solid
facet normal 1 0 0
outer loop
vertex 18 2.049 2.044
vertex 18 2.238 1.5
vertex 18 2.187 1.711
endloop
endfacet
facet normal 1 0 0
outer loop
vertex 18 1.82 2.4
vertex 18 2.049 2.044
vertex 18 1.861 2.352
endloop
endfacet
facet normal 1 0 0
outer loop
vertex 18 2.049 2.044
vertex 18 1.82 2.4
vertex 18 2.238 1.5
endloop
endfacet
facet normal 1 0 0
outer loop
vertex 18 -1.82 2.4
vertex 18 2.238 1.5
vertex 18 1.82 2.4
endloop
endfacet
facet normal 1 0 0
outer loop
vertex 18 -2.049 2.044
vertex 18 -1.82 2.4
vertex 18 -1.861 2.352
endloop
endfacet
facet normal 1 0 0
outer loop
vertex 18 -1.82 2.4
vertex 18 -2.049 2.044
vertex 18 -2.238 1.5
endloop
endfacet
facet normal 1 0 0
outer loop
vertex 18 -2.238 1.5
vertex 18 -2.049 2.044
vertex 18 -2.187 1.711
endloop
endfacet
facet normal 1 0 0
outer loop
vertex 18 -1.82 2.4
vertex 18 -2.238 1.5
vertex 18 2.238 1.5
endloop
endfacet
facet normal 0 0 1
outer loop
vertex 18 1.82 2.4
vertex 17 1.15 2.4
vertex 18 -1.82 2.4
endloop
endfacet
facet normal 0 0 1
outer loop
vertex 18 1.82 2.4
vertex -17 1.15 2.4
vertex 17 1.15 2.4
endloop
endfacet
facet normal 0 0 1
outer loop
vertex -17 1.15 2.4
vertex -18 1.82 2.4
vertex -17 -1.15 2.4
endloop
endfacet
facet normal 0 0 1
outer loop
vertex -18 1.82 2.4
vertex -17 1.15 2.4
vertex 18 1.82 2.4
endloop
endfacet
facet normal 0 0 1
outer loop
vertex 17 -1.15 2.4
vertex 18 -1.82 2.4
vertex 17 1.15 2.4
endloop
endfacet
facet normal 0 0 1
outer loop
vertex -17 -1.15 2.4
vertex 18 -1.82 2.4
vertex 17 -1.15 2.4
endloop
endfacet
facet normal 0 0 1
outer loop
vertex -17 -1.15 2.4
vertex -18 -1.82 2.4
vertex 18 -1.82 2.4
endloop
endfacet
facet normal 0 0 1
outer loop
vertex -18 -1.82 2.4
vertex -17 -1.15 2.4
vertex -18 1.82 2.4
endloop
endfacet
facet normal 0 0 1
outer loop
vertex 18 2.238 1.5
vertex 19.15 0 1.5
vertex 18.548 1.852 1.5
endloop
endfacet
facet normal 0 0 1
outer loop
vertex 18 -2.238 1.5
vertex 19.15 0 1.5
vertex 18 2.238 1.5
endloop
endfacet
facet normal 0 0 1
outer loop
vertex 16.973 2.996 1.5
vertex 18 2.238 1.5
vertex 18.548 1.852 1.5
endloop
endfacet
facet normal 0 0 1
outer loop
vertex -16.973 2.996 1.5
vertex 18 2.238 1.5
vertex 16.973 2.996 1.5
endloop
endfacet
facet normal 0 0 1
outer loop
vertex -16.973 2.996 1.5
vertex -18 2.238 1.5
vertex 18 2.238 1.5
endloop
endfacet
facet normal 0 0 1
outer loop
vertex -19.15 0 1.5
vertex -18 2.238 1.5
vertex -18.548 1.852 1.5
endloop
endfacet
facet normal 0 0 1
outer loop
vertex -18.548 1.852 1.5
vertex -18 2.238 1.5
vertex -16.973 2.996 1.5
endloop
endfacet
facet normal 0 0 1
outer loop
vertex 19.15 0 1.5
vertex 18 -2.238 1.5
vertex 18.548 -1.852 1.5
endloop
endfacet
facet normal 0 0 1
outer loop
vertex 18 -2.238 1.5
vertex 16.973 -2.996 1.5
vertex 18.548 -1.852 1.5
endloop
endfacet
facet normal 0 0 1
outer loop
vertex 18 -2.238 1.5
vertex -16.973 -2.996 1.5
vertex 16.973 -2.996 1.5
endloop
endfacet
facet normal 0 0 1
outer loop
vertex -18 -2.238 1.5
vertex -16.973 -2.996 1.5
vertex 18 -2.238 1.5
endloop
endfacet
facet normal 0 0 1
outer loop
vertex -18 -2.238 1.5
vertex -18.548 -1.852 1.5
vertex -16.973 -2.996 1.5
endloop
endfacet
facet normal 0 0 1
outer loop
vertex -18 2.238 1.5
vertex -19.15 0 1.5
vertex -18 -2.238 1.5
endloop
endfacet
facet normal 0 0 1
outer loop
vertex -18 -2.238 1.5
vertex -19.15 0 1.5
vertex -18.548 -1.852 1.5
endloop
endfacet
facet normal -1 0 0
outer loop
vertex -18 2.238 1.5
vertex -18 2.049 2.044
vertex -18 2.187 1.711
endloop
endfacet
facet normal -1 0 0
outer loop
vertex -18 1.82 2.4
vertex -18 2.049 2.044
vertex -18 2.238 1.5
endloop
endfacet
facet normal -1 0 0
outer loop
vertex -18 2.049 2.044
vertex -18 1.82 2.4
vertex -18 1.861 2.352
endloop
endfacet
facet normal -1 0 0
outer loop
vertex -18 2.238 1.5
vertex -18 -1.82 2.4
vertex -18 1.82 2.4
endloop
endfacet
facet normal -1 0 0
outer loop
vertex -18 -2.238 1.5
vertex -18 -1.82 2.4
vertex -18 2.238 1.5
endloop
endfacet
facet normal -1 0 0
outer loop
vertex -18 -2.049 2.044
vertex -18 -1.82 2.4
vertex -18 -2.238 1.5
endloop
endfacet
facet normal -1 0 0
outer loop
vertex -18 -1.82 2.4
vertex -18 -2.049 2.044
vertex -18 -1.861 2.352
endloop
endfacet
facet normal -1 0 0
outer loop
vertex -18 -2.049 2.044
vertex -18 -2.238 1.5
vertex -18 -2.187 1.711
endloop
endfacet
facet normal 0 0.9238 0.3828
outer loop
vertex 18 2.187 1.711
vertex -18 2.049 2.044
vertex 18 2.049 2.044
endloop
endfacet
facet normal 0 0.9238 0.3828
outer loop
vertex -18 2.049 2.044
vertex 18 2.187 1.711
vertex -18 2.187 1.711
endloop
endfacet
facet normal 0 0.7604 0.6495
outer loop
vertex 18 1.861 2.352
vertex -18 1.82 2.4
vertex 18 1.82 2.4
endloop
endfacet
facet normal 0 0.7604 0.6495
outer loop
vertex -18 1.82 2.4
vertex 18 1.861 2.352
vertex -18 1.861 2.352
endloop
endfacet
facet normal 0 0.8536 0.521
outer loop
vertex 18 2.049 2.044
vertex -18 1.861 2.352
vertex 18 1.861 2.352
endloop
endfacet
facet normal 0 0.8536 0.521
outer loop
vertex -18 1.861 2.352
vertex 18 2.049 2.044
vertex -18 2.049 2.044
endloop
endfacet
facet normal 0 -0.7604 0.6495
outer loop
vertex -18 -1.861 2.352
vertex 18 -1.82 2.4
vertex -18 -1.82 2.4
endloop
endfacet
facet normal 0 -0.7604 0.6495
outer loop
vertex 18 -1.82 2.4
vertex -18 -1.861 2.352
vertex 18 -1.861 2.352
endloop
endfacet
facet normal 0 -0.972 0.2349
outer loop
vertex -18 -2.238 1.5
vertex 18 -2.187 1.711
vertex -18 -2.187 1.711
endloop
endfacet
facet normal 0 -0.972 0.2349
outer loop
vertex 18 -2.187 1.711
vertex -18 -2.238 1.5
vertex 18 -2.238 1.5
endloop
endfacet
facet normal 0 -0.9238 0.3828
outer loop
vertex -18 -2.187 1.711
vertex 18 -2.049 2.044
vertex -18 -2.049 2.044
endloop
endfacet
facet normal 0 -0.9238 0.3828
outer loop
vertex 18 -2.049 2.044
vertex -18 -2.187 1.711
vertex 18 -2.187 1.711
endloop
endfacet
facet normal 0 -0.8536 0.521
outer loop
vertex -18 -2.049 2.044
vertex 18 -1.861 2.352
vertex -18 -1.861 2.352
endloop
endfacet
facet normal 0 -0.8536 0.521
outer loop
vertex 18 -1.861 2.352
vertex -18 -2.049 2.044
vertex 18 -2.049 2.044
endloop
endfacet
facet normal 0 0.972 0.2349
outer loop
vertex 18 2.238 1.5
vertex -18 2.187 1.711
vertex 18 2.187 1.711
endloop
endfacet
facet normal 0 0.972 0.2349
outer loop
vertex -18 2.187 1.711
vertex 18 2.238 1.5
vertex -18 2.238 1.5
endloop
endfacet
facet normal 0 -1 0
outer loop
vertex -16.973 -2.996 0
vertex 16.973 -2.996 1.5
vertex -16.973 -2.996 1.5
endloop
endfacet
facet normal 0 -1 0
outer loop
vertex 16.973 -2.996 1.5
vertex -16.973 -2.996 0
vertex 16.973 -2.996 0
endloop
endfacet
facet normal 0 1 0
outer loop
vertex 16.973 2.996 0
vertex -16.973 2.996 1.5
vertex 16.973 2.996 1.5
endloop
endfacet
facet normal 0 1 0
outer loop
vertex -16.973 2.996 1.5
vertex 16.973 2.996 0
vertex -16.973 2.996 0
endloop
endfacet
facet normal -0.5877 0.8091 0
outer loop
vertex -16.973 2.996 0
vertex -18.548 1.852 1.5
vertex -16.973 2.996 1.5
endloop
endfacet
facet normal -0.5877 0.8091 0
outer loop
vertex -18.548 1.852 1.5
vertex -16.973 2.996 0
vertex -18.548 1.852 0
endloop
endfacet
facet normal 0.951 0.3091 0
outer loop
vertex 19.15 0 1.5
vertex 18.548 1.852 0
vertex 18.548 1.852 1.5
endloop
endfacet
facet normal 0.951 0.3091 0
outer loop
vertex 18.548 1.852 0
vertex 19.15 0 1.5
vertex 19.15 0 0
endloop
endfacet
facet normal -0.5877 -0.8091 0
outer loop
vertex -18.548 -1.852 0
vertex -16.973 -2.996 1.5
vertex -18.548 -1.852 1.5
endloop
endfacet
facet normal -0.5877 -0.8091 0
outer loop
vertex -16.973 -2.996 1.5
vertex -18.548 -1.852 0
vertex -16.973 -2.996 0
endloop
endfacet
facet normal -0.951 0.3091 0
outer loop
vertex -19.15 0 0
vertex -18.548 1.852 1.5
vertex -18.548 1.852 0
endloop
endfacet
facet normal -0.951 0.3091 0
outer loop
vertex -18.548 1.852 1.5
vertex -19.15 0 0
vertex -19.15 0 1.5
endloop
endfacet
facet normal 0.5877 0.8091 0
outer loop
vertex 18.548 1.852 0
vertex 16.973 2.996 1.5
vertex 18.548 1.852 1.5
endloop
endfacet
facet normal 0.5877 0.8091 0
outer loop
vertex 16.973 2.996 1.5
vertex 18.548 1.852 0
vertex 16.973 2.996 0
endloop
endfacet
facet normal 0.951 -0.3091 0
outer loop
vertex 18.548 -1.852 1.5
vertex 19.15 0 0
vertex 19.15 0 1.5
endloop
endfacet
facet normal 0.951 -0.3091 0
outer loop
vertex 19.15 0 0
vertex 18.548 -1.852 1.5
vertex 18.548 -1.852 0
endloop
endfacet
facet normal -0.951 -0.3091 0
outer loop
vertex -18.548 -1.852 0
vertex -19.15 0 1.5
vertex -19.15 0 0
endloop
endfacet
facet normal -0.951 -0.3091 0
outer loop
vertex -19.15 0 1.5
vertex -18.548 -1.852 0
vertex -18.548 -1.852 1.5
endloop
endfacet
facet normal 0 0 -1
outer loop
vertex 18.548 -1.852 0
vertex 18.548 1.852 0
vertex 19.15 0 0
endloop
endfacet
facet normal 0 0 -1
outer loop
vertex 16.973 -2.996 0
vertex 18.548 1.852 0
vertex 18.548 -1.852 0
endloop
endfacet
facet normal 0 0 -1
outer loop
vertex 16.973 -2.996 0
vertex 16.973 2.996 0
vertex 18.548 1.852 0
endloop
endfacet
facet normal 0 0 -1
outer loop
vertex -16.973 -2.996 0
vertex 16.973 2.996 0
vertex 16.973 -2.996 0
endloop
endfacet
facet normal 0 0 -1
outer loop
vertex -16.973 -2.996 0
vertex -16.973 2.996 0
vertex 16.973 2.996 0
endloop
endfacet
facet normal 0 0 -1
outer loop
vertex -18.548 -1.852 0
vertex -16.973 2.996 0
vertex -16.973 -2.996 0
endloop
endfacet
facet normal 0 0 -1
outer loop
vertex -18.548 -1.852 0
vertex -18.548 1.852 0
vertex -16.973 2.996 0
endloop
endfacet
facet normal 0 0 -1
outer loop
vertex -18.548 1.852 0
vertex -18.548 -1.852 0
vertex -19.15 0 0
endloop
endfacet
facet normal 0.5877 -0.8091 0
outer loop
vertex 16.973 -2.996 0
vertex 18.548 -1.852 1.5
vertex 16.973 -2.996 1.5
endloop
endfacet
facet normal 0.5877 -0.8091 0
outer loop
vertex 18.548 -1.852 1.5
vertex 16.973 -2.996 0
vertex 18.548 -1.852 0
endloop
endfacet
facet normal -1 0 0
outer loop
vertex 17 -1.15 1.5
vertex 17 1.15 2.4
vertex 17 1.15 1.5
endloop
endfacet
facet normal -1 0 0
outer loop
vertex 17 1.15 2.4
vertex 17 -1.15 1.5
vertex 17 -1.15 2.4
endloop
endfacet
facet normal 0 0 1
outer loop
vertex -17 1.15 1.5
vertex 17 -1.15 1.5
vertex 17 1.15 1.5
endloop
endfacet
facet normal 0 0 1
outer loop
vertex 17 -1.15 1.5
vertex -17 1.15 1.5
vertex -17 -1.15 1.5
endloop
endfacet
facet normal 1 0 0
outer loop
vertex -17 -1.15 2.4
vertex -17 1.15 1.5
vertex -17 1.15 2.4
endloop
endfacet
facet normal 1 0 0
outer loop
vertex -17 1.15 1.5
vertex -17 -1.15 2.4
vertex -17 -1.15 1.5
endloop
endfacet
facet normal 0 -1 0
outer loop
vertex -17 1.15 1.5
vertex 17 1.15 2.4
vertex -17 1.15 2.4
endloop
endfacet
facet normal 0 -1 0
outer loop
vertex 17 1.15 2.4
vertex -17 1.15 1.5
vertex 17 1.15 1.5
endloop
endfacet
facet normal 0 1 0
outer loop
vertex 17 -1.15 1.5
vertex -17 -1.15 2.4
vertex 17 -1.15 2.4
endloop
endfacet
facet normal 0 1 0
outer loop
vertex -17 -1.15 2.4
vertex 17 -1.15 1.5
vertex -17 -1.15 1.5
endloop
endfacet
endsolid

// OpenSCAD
// file: components.scad
include <constants.scad>

*arduinoMock();
*motorMock();
*gyroMock();


// Main Arduino pro micro
arduinoSize = [34,2.3,18]; //[34,2.3,18]; ok values

module arduinoMock(){
		translate([0,0,arduinoSize[2]/2])cube(arduinoSize,center = true);	

		for (x = [0:12], y=[-1,1]) {
			*%translate([-arduinoSize[0]/2+(x+3/4)*INCH/10, 0, arduinoSize[2]/2+y*(arduinoSize[2]/2-INCH/20)])rotate([90,0,0])cylinder(r=INCH/30, h=arduinoSize[1]+.2,center = true,$fn=20);
		}
}

module arduinoHull(){
	clipThickness = .9;
	
	intersection() {
		translate([-arduinoSize[0]/2-strongThicknessHV[0],-arduinoSize[1]/2-strongThicknessHV[1],0])cube([arduinoSize[0]+2*strongThicknessHV[0], 2*strongThicknessHV[1]+arduinoSize[1], clipThickness]);
		translate([0,0,-arduinoSize[1]+2*clipThickness])rotate([0, 90, 0])cylinder(r=arduinoSize[1], h=arduinoSize[0]+2*strongThicknessHV[1]-.001,$fn=40,center = true);
	}

	//TODO remove after test print
	*translate([INCH/10,-arduinoSize[1]/2-minimumThicknessHV[0],0])cube([3/10*INCH,2*minimumThicknessHV[0]+arduinoSize[1],INCH/10]);
}

// gyro / acc

gyroSize=[20.5,16,1.8];
gyroFullThickness = 2.4;
gyroHolePadding=1.5;
gyroHoleRad = 1.25;

module gyroMock(){
	difference(){
		union() {
			translate([0,0,gyroFullThickness/2])cube(gyroSize+[0,0,gyroFullThickness-gyroSize[2]],center = true);

			

			for (x = [0:7]) {
				%translate([-gyroSize[0]/2+(x+1/2)*INCH/10, gyroSize[1]/2-INCH/20, gyroSize[2]/2])cylinder(r=INCH/30, h=gyroSize[2]+.2,center = true,$fn=20);
			}
		}
		for (i = [-1,1]) {
			translate([-i*(gyroSize[0]/2-gyroHoleRad-gyroHolePadding),-gyroSize[1]/2+gyroHoleRad+gyroHolePadding,0])cylinder(r=gyroHoleRad, h=gyroFullThickness+.1, $fn=40);
			translate([-i*(gyroSize[0]/2-gyroHoleRad),-gyroSize[1]/2+gyroHoleRad/2+gyroHolePadding,gyroFullThickness/2+gyroSize[2]/2])cube([gyroHoleRad+gyroHolePadding,gyroHoleRad+gyroHolePadding,gyroFullThickness-gyroSize[2]],center = true);
			translate([-i*(gyroSize[0]/2-gyroHoleRad/2-gyroHolePadding),-gyroSize[1]/2-gyroHoleRad/2+gyroHolePadding,gyroFullThickness/2+gyroSize[2]/2])cube([gyroHoleRad+gyroHolePadding,gyroHoleRad+gyroHolePadding,gyroFullThickness-gyroSize[2]],center = true);
			translate([-i*(gyroSize[0]/2-gyroHolePadding+gyroHoleRad/2),-gyroSize[1]/2-gyroHoleRad/2+gyroHolePadding,gyroFullThickness/2+gyroSize[2]/2])cube([gyroHoleRad+gyroHolePadding,gyroHoleRad+gyroHolePadding,gyroFullThickness-gyroSize[2]],center = true);

		}
		translate([0,gyroSize[1]/2-INCH/10-INCH/20,gyroFullThickness/2+gyroSize[2]/2])cube([gyroSize[0],INCH/10,gyroFullThickness-gyroSize[2]],center = true);


	}
}

module gyroHull(){
	*translate([0,0,strongThicknessHV[1]/2])cube([25,20,strongThicknessHV[1]], center = true);
		translate([0,0,gyroFullThickness/2-0.01])cube(gyroSize+minimumThicknessHV[0]*[1,1,0]+[0,0,gyroFullThickness-gyroSize[2]-0.1,1], center = true);
		
		for (i = [-1,1]) {
			translate([-i*(gyroSize[0]/2+i*gyroHoleRad-INCH/20+i*minimumThicknessHV[0]/2),gyroSize[1]/2-gyroHoleRad-INCH/20-minimumThicknessHV[0]/2,gyroSize[2]-0.1])cube([2*gyroHoleRad+minimumThicknessHV[0],2*gyroHoleRad+minimumThicknessHV[0],minimumThicknessHV[1]]);
		}
}


// receiver

rxSize=[15.2,23,1.6];
rxAntennaSize=[1,30,1.8];
rxFullThickness = 2.4;

module rxMock(){
	difference() {
		//union() {
			translate([0,0,rxFullThickness/2-0.01])cube(rxSize+[0,0,rxFullThickness-rxSize[2]],center = true);
	
		//}
		translate([0, rxSize[1]/2-13.5, rxFullThickness/2-rxSize[2]/2])cube([rxSize[0],1,rxFullThickness-rxSize[2]] , center = true);
		translate([rxSize[0]/2-5, rxSize[1]/2, rxFullThickness/2-rxSize[2]/2])cube([3, 2, rxFullThickness-rxSize[2]], center= true);
		translate([rxSize[0]/2-5, -rxSize[1]/2, rxFullThickness/2-rxSize[2]/2])cube([3, 2, rxFullThickness-rxSize[2]], center= true);
	}
	//translate([-rxSize[0]/2,rxSize[1]/2,rxFullThickness-rxSize[2]])translate([rxAntennaSize[0]/2,rxAntennaSize[1]/2])cube(rxAntennaSize+[0,0,0],center = true);
	translate([rxSize[0]/2-rxAntennaSize[0],rxSize[1]/2+minimumThicknessHV[1],rxFullThickness-rxSize[2]])rotate([2,0,90])cube(rxAntennaSize+[0,0,0]);
	translate([rxSize[0]/2-rxAntennaSize[0],rxSize[1]/2-minimumThicknessHV[1],rxFullThickness-rxSize[2]])cube([rxAntennaSize[0],2*rxAntennaSize[0],rxAntennaSize[2]]);

}


module rxHull(){
 	translate([0,0,rxFullThickness/2-0.01])cube(rxSize+[2*minimumThicknessHV[1],2*minimumThicknessHV[1],rxFullThickness-rxSize[2]-0.01],center = true);
}

// esc's

escSize=[15,3.5,12.3];

// batery

batSize = [24,43,9];

// motors

motorRHTop = [6,5.5];
motorRHMiddle = [3.75,5];
motorRHBottom = [2.10,8];
motorRHPin = [.5,9];

motorRH = [max(motorRHTop[0],motorRHBottom[0]),motorRHBottom[1]+motorRHTop[1]];

module motorMock(){
	union() {
	translate([0,0,0])cylinder(r=motorRHBottom[0], h=motorRHBottom[1],$fn=40);
	intersection() {
		translate([0,0,motorRHBottom[1]-motorRHMiddle[1]])cylinder(r1=motorRHBottom[0],r2=motorRHMiddle[0], h=motorRHMiddle[1],$fn=40);
		translate([-motorRHBottom[0]+minimumThicknessHV[0],0,0])cube([2*motorRHBottom[0]-2*minimumThicknessHV[0],motorRHTop[0],motorRH[1]]);
	}
	difference() {
		translate([0,0,motorRHBottom[1]-strongThicknessHV[0]])cylinder(r=motorRHTop[0], h=motorRHTop[1]+strongThicknessHV[0]+.01,$fn=40);
		*translate([0,0,motorRHBottom[1]-strongThicknessHV[0]-.01])cylinder(r=motorRHTop[0]-strongThicknessHV[1], h=strongThicknessHV[0],$fn=40);	
	}

	translate([0,0,motorRHBottom[1]+motorRHTop[1]])cylinder(r=motorRHPin[0], h=motorRHPin[1],$fn=20);
	}
}

module motorHull(){
	ventHoleRad = 2*3.14*motorRH[0]/16-minimumThicknessHV[0];
	union() {
		difference() {
			union() {
				cylinder(r=motorRHBottom[0]+strongThicknessHV[0], h=motorRHBottom[1],$fn=40);
				translate([0,0,motorRHBottom[1]-motorRHMiddle[1]]){
					intersection() {
						translate([0,0,-strongThicknessHV[0]])cylinder(r=motorRH[0]+strongThicknessHV[0], h=motorRH[0]+strongThicknessHV[0],$fn=40);
						translate([0,0,motorRHMiddle[1]])sphere(r=motorRH[0]+strongThicknessHV[0],$fn=40);
				}
			}
			translate([0,0,motorRHBottom[1]])cylinder(r=motorRH[0]+strongThicknessHV[0], h=motorRHTop[1],$fn=40);
		}
			rotate([0, 0, -90])
			for (a = [45:45:315]) {
					hull() {
						translate([0,0,motorRH[1]])rotate([140, 0, a])cylinder(r1=0,r2=ventHoleRad, h=2*motorRH[0],$fn=40);	
						translate([0,0,motorRH[1]-strongThicknessHV[1]-ventHoleRad])rotate([90, 0, a])cylinder(r1=0,r2=ventHoleRad, h=2*motorRH[0],$fn=40);	
					}
			}
		}

		
	}
	
}

// utilities

module unionDiff(){
	difference() {
		union() {
			for (i = [0:$children-2]) {
				children(i);
			}
		}
		children($children-1);
	}
}
// file: constants.scad
INCH = 25.4;

tightFitThickness = .1;

strongThicknessHV = [1,1.5];
minimumThicknessHV = [.5,.3];

pinRad = 1.30; //tested for 1.75 filament on reprap huxley
// main file
include <constants.scad>
include <components.scad>

*motorMock();
*motorTest();
arduinoTest();
*gyroTest();
*rxTest();

*allComponents();

module arduinoTest() {
	difference() {
	union() {
		hull(){
			translate([-arduinoSize[0]/2+strongThicknessHV[0],0,0])cylinder(r=arduinoSize[1]/2+2*strongThicknessHV[0], h=strongThicknessHV[1]);
			translate([arduinoSize[0]/2-strongThicknessHV[0],0,0])cylinder(r=arduinoSize[1]/2+2*strongThicknessHV[0], h=strongThicknessHV[1]);
		}

		translate([0, 0, strongThicknessHV[1]])arduinoHull();
	}
	translate([0, 0, strongThicknessHV[1]])arduinoMock();
}
}

module gyroTest(){
	difference() {
		union() {
			translate([0,0,strongThicknessHV[1]/2])cube(gyroSize+[2,2,-gyroSize[2]+strongThicknessHV[1]],center = true);
			gyroHull();
		}
		#translate([0,0,gyroFullThickness-0.01])rotate([180,0,0])gyroMock();
	}
}


module rxTest(){
	rotate([0, 0, 90])
	difference() {
		union() {
			translate([0,0,strongThicknessHV[1]/2])cube(rxSize+[2,2,-rxSize[2]+strongThicknessHV[1]],center = true);
			rxHull();
		}
		#translate([0,0,-0.001])rxMock();
	}
}

module motorTest(){
		difference() {
			union() {
				motorHull();
				cylinder(r=10, h=.3);
			}
			#translate([0,0,0])motorMock();
			cylinder(r=motorRHBottom[0], h=motorRHBottom[1]);
		}
}


// display all

module allComponents(){
	motorTest();
	translate([0,-15,0])arduinoTest();
	translate([0,-30,0])gyroTest();
	translate([0,-50,0])rxTest();
}
